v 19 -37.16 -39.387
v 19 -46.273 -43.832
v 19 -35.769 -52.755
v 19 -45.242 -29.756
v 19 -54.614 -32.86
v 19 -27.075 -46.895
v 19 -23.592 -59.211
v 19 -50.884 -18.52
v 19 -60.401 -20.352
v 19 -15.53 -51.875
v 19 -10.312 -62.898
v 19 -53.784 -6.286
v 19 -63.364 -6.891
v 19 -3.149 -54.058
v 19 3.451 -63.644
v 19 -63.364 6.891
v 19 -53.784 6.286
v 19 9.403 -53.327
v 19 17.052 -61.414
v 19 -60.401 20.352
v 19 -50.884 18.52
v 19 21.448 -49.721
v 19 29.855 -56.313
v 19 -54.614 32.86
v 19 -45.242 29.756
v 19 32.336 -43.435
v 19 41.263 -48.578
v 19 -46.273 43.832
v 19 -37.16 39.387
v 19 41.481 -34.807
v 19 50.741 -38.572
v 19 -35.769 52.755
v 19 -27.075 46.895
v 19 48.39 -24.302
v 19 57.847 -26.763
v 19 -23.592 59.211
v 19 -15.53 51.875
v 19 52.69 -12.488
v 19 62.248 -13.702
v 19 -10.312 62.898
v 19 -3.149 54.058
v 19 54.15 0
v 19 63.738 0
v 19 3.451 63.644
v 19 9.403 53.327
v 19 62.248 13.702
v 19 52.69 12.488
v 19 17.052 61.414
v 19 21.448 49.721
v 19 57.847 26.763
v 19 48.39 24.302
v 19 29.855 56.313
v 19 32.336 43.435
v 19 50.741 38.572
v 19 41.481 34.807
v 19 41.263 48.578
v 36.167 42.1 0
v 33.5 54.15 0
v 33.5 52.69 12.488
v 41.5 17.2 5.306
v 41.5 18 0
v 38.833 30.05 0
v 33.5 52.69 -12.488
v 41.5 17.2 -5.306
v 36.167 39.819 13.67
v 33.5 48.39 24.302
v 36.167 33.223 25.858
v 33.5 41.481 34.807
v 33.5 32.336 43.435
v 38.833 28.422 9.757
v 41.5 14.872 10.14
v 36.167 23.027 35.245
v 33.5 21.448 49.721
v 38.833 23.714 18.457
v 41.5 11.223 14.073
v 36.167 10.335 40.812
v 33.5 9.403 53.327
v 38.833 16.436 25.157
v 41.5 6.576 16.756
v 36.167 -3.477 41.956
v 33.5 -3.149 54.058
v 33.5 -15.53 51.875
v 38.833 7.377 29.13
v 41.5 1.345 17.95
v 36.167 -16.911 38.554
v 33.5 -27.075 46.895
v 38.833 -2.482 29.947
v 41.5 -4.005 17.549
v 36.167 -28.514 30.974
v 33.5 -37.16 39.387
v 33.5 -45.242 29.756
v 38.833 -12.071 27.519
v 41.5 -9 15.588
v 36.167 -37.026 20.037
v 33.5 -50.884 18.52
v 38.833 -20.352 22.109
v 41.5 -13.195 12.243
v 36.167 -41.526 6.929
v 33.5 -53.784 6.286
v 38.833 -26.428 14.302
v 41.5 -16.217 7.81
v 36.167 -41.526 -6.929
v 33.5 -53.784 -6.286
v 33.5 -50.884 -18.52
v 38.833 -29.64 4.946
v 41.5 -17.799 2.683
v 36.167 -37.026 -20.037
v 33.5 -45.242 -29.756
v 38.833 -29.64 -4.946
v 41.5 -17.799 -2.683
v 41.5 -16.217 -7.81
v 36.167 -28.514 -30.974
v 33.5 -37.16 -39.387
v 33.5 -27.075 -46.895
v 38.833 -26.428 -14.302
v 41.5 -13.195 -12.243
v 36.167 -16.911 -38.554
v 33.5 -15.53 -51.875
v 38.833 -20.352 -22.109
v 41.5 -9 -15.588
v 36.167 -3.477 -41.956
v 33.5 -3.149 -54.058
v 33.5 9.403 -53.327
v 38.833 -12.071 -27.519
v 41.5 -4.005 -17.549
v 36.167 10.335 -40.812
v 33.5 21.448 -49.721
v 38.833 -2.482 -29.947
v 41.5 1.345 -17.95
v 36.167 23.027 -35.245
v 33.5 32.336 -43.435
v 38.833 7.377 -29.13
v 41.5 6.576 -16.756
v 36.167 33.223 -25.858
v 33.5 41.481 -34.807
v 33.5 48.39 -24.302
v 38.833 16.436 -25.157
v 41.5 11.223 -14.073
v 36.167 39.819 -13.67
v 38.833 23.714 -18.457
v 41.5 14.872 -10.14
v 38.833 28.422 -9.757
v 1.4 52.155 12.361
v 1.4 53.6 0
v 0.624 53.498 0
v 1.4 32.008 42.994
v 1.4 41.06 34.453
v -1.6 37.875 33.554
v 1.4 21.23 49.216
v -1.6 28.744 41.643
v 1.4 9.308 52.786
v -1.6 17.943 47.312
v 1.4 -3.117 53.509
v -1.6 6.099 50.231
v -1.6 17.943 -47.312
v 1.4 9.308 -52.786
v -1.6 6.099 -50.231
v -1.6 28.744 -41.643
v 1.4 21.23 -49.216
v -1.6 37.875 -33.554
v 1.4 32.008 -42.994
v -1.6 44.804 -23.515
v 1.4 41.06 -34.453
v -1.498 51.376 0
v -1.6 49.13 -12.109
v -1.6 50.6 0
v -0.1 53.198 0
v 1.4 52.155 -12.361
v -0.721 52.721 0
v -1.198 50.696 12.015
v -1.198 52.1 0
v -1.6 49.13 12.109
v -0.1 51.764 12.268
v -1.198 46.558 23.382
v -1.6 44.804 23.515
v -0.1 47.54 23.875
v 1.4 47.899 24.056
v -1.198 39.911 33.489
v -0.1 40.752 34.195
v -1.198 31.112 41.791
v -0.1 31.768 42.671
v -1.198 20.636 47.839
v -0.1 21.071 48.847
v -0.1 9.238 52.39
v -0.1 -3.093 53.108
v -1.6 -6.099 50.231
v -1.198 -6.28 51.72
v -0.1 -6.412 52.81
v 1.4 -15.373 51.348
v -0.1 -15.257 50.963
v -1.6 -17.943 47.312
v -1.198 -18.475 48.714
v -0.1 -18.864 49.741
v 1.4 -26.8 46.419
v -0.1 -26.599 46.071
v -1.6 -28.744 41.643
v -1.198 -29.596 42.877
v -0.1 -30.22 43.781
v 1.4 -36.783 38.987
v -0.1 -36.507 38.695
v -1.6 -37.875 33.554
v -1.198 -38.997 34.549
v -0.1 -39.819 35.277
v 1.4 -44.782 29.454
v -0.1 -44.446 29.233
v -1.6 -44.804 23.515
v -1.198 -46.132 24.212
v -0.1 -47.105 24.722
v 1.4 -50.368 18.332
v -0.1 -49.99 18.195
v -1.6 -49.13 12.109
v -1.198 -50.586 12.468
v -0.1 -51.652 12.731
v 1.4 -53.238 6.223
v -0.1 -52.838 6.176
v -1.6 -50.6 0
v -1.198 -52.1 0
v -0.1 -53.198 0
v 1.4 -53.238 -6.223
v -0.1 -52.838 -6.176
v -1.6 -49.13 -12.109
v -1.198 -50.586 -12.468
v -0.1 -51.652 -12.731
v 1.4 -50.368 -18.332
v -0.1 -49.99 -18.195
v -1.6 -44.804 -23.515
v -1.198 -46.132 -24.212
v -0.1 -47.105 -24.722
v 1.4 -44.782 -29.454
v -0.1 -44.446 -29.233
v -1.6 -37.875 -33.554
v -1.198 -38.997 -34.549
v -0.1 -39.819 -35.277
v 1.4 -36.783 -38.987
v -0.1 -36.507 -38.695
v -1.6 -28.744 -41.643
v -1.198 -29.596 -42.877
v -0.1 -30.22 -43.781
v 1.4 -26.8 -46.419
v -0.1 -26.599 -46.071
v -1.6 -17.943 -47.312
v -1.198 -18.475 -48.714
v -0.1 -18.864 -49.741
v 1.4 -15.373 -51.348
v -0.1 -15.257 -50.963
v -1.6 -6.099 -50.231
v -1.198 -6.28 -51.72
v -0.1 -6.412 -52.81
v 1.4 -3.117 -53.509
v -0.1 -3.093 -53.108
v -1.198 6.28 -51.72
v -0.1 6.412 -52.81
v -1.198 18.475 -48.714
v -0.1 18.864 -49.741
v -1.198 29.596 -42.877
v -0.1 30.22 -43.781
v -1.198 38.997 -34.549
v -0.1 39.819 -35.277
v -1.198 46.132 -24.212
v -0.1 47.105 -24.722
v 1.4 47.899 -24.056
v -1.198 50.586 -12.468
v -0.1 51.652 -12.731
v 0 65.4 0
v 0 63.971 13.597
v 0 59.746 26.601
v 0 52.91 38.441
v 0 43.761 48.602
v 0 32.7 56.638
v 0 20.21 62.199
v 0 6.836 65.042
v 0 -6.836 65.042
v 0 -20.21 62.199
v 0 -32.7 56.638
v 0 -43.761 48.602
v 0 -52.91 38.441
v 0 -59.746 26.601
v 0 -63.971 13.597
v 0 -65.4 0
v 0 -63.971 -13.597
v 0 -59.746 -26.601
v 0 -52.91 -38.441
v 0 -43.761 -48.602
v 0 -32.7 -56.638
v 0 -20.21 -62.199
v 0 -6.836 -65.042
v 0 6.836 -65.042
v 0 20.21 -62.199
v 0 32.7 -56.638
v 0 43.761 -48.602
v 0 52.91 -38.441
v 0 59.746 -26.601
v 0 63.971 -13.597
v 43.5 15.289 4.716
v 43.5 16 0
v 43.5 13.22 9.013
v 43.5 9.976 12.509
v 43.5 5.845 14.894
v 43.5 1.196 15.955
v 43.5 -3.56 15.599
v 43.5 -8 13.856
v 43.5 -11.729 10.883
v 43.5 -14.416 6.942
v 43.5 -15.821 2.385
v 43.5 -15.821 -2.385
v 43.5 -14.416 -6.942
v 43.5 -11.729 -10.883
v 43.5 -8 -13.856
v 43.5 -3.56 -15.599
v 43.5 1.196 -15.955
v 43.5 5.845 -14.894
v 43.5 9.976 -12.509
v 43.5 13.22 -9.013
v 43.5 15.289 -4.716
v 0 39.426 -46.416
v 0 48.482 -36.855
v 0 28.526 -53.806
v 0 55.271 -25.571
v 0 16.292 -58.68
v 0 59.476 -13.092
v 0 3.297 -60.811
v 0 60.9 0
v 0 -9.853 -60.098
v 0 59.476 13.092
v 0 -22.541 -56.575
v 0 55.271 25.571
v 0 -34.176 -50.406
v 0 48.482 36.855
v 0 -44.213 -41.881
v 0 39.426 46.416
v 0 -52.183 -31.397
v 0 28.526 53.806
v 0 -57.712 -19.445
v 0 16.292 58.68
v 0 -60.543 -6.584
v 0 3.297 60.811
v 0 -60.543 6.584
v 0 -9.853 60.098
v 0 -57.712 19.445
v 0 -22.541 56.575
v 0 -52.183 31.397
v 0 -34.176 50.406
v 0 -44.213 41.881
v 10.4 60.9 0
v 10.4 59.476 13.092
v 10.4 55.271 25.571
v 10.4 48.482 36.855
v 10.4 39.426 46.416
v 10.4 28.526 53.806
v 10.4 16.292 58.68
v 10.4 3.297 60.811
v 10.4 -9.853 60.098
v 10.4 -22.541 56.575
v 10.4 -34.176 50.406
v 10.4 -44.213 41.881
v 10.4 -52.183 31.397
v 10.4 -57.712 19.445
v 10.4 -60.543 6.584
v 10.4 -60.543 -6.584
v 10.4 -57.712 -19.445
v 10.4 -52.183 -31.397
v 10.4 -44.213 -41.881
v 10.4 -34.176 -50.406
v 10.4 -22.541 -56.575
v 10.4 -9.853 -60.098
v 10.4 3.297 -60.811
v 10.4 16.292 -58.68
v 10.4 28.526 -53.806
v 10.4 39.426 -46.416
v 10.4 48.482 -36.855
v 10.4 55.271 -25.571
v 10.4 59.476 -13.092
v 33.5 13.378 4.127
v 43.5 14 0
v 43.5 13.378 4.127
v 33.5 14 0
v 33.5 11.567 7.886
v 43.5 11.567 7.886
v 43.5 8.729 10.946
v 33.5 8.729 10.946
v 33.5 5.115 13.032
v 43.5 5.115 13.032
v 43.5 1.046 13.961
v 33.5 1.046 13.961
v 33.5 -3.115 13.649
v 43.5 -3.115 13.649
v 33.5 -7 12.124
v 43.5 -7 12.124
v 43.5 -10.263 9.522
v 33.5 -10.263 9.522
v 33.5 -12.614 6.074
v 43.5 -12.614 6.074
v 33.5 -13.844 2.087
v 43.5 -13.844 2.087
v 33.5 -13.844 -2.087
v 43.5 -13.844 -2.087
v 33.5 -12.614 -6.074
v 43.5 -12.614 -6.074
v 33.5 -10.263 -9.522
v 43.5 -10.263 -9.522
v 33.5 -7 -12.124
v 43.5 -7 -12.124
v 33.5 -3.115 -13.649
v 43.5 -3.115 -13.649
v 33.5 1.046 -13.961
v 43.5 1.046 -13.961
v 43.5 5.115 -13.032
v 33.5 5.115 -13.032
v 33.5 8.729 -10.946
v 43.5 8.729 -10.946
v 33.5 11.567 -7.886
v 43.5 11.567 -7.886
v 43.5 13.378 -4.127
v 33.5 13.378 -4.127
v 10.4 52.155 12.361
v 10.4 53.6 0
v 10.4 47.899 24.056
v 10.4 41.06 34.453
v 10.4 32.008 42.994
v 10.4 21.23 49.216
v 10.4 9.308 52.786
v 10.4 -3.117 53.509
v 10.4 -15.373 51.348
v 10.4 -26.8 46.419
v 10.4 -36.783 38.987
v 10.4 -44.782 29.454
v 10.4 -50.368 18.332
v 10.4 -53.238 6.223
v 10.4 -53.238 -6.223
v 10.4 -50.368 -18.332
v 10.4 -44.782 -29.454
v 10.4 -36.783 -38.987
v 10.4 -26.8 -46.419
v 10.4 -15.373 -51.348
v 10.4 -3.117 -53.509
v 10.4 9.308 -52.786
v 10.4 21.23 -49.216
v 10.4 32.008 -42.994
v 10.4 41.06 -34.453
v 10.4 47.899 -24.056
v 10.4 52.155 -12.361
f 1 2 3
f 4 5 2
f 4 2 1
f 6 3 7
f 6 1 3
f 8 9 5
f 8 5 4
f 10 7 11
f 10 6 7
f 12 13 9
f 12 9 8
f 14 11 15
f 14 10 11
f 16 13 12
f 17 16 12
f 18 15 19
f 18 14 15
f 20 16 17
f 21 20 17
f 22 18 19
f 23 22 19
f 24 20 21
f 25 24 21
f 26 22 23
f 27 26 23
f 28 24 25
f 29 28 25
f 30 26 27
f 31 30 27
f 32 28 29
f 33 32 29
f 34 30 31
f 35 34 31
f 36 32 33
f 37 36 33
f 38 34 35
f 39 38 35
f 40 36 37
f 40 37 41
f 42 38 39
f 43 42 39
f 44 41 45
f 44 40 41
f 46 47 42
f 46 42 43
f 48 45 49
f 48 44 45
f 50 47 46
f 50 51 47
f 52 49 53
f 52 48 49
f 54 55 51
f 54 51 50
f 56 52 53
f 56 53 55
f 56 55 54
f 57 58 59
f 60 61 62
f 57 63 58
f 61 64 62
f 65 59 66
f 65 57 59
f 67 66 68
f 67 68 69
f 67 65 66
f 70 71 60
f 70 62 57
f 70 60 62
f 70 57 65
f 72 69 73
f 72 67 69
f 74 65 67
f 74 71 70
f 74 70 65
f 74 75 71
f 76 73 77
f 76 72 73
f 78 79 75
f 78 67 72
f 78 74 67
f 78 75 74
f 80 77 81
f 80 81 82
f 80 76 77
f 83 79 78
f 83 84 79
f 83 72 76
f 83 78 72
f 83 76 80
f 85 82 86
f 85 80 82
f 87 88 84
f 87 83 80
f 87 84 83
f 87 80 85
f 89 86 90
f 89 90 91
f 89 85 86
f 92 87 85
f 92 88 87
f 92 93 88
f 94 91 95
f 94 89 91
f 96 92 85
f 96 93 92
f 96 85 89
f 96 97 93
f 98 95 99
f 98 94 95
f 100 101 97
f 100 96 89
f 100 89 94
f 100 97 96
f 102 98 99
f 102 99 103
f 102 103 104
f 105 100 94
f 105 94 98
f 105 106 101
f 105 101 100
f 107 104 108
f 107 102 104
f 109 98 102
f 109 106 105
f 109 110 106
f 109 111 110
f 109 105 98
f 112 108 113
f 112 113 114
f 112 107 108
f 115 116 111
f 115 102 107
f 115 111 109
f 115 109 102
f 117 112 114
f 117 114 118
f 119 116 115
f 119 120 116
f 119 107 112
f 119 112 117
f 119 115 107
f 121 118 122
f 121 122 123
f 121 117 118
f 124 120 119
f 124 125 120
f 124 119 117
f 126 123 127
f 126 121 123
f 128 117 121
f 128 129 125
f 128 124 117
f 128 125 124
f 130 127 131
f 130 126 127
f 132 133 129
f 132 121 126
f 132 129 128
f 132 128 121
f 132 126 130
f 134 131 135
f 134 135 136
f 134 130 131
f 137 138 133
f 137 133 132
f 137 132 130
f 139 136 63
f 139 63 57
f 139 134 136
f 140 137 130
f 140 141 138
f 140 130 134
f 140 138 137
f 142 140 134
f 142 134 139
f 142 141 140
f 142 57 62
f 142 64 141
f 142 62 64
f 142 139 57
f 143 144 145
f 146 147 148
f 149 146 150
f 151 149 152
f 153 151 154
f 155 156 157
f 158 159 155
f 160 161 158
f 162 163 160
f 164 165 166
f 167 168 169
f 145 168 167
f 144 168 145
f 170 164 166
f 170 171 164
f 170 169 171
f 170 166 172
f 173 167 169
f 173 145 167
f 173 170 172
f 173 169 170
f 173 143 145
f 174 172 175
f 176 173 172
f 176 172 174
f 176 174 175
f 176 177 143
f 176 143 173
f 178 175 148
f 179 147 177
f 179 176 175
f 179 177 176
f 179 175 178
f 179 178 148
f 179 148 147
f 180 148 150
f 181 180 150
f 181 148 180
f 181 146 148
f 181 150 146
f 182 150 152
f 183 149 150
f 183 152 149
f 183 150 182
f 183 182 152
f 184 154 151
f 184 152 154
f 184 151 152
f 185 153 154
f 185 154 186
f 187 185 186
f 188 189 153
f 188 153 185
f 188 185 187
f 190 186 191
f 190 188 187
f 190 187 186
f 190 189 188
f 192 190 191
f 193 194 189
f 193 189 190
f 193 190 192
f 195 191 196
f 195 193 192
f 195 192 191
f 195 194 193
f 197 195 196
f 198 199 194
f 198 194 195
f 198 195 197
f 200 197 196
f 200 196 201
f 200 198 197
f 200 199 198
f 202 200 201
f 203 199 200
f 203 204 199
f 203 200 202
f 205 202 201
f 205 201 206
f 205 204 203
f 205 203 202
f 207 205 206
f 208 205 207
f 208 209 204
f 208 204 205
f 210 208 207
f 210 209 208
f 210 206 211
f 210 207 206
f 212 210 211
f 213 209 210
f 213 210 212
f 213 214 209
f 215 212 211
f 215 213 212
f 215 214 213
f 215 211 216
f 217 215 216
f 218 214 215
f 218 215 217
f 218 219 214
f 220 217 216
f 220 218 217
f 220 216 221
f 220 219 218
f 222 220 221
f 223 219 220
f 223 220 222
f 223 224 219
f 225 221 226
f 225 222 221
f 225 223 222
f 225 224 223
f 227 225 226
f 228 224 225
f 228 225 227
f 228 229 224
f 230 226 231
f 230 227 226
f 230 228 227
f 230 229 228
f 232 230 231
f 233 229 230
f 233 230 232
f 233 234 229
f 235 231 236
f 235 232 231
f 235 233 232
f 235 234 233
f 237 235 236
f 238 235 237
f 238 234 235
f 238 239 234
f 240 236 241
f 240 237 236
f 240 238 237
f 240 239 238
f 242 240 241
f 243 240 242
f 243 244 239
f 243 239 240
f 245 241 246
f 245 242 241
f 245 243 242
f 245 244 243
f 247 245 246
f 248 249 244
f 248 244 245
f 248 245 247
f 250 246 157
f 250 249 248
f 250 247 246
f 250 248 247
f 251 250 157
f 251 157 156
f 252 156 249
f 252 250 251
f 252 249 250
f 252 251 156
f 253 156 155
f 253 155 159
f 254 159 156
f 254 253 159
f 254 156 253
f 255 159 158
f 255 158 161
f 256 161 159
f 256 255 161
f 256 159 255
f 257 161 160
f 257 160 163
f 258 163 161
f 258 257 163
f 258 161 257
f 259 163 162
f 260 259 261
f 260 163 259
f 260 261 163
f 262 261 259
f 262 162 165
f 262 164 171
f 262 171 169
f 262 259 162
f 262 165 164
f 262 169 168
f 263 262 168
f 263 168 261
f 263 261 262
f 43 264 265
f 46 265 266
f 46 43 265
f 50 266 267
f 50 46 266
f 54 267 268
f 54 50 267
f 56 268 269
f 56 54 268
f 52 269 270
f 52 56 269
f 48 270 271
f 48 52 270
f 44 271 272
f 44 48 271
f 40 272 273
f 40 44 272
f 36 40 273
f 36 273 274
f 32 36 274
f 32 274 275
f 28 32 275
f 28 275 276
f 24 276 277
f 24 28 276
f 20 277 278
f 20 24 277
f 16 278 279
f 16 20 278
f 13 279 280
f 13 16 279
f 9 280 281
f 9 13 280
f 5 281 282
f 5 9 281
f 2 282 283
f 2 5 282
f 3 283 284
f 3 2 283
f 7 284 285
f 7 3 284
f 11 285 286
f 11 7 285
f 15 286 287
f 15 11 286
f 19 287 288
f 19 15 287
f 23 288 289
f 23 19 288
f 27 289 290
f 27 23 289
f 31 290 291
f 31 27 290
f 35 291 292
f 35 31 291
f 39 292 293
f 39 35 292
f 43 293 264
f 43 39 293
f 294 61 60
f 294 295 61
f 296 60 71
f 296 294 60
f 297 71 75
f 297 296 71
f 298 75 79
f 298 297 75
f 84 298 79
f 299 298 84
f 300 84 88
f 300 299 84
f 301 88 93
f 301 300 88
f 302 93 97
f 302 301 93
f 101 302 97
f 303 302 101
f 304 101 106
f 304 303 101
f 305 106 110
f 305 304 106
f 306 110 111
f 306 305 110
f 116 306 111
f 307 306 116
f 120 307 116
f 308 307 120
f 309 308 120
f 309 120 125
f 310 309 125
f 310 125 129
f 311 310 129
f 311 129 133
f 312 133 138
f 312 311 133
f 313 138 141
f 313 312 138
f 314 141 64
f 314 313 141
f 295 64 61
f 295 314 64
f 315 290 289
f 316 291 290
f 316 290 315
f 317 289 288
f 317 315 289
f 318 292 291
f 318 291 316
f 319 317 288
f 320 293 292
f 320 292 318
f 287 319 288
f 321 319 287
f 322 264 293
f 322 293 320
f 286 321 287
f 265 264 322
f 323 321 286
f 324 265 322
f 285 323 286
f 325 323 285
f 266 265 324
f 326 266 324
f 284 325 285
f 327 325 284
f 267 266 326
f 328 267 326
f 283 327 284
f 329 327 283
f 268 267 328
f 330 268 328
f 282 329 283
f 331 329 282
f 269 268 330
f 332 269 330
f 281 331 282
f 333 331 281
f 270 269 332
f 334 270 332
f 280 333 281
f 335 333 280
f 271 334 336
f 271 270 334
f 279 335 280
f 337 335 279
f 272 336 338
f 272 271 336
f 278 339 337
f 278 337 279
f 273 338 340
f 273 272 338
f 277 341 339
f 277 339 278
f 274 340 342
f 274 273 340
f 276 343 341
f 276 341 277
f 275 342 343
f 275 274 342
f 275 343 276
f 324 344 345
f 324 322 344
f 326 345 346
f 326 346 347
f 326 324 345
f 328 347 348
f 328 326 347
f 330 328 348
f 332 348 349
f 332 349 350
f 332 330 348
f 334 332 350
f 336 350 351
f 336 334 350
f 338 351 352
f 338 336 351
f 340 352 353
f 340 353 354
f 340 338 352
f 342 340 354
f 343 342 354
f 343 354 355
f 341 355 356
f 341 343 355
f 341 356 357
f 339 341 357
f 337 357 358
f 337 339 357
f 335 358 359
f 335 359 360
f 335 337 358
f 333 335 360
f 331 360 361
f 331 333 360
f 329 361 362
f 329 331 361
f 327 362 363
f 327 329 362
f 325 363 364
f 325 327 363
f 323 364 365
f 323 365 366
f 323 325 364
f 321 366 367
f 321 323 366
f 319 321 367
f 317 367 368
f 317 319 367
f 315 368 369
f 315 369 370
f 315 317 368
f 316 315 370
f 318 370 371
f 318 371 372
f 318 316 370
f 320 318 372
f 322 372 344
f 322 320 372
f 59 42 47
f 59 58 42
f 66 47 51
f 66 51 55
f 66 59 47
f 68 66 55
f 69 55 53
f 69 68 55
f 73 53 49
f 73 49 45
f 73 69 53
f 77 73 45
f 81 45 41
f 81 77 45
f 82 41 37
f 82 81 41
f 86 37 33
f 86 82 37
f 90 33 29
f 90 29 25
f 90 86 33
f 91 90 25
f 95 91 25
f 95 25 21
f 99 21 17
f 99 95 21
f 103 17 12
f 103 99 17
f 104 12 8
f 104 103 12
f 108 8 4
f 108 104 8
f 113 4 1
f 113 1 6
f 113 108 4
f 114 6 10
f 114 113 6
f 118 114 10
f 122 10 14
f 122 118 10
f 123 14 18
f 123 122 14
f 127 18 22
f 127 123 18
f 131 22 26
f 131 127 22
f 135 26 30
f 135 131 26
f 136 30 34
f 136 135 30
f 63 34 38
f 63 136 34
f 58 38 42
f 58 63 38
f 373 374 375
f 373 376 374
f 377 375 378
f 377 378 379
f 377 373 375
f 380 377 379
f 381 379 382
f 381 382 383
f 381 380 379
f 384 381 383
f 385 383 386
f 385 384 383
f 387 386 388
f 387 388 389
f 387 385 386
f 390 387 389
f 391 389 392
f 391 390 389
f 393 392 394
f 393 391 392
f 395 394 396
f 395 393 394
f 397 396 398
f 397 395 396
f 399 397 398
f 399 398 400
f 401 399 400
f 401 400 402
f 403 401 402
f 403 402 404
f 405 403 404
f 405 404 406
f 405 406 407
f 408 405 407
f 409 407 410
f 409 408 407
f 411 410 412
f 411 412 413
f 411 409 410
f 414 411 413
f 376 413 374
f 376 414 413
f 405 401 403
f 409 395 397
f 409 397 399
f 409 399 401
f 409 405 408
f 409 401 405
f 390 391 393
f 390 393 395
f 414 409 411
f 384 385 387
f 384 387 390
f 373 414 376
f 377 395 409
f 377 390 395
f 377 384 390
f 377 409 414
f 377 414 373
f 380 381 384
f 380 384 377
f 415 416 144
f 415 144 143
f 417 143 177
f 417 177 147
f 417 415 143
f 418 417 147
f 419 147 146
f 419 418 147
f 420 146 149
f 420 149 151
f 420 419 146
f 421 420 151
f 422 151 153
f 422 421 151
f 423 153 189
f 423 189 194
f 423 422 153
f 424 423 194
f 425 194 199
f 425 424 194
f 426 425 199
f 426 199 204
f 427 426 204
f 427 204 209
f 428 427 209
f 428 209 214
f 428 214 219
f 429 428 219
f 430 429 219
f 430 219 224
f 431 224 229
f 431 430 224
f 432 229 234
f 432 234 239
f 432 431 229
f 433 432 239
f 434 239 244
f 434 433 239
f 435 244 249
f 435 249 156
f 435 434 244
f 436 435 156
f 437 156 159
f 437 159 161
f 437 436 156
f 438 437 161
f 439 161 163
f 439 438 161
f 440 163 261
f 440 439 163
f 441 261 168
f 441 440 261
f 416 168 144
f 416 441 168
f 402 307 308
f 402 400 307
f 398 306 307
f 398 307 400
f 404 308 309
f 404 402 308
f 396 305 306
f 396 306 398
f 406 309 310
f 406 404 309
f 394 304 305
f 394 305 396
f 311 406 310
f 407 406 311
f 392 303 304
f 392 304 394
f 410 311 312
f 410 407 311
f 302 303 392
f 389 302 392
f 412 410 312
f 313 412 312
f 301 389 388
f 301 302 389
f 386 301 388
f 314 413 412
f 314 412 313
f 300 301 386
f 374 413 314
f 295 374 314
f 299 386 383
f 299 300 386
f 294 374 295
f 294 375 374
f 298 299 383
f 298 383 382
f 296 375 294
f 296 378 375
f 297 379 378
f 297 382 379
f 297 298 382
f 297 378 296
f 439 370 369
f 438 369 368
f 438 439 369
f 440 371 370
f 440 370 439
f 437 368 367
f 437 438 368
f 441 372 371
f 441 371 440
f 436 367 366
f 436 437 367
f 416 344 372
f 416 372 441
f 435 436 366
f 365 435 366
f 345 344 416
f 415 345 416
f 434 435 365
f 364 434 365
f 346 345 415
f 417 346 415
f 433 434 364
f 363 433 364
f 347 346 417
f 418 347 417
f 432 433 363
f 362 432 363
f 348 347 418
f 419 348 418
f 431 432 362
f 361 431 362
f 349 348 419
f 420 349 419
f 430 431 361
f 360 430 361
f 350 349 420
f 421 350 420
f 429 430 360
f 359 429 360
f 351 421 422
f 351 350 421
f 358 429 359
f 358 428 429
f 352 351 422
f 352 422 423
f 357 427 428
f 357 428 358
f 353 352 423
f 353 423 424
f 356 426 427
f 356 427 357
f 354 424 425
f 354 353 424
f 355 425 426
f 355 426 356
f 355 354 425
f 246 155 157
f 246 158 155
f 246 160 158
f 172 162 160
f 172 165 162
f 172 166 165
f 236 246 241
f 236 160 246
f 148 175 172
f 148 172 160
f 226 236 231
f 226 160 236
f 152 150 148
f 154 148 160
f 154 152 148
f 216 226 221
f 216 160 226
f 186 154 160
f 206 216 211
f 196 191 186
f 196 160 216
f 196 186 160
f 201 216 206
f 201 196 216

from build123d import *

# Parameters (mm, degrees)
FILLET1_R = 3


with BuildPart() as part:
    # Sketch1 → Revolve1 (revolve)
    with BuildSketch(Plane.XY):
        Polygon((0, 65.4), (19, 63.737715393), (19, 54.15), (33.5, 54.15), (41.5, 18), (43.5, 16), (43.5, 14), (33.5, 14), (33.5, 0), (0, 0), (-1.6, 0), (-1.6, 53.6), (10.4, 53.6), (10.4, 60.9), (0, 60.9), align=None)
    revolve(axis=Axis((0, 0, 0), (1, 0, 0)))

    # Fillet1
    fillet1_edges = [part.edges().sort_by_distance(p)[0] for p in [
        (-1.6, -53.6, 0),
    ]]
    fillet(fillet1_edges, radius=FILLET1_R)


solid = part.part
